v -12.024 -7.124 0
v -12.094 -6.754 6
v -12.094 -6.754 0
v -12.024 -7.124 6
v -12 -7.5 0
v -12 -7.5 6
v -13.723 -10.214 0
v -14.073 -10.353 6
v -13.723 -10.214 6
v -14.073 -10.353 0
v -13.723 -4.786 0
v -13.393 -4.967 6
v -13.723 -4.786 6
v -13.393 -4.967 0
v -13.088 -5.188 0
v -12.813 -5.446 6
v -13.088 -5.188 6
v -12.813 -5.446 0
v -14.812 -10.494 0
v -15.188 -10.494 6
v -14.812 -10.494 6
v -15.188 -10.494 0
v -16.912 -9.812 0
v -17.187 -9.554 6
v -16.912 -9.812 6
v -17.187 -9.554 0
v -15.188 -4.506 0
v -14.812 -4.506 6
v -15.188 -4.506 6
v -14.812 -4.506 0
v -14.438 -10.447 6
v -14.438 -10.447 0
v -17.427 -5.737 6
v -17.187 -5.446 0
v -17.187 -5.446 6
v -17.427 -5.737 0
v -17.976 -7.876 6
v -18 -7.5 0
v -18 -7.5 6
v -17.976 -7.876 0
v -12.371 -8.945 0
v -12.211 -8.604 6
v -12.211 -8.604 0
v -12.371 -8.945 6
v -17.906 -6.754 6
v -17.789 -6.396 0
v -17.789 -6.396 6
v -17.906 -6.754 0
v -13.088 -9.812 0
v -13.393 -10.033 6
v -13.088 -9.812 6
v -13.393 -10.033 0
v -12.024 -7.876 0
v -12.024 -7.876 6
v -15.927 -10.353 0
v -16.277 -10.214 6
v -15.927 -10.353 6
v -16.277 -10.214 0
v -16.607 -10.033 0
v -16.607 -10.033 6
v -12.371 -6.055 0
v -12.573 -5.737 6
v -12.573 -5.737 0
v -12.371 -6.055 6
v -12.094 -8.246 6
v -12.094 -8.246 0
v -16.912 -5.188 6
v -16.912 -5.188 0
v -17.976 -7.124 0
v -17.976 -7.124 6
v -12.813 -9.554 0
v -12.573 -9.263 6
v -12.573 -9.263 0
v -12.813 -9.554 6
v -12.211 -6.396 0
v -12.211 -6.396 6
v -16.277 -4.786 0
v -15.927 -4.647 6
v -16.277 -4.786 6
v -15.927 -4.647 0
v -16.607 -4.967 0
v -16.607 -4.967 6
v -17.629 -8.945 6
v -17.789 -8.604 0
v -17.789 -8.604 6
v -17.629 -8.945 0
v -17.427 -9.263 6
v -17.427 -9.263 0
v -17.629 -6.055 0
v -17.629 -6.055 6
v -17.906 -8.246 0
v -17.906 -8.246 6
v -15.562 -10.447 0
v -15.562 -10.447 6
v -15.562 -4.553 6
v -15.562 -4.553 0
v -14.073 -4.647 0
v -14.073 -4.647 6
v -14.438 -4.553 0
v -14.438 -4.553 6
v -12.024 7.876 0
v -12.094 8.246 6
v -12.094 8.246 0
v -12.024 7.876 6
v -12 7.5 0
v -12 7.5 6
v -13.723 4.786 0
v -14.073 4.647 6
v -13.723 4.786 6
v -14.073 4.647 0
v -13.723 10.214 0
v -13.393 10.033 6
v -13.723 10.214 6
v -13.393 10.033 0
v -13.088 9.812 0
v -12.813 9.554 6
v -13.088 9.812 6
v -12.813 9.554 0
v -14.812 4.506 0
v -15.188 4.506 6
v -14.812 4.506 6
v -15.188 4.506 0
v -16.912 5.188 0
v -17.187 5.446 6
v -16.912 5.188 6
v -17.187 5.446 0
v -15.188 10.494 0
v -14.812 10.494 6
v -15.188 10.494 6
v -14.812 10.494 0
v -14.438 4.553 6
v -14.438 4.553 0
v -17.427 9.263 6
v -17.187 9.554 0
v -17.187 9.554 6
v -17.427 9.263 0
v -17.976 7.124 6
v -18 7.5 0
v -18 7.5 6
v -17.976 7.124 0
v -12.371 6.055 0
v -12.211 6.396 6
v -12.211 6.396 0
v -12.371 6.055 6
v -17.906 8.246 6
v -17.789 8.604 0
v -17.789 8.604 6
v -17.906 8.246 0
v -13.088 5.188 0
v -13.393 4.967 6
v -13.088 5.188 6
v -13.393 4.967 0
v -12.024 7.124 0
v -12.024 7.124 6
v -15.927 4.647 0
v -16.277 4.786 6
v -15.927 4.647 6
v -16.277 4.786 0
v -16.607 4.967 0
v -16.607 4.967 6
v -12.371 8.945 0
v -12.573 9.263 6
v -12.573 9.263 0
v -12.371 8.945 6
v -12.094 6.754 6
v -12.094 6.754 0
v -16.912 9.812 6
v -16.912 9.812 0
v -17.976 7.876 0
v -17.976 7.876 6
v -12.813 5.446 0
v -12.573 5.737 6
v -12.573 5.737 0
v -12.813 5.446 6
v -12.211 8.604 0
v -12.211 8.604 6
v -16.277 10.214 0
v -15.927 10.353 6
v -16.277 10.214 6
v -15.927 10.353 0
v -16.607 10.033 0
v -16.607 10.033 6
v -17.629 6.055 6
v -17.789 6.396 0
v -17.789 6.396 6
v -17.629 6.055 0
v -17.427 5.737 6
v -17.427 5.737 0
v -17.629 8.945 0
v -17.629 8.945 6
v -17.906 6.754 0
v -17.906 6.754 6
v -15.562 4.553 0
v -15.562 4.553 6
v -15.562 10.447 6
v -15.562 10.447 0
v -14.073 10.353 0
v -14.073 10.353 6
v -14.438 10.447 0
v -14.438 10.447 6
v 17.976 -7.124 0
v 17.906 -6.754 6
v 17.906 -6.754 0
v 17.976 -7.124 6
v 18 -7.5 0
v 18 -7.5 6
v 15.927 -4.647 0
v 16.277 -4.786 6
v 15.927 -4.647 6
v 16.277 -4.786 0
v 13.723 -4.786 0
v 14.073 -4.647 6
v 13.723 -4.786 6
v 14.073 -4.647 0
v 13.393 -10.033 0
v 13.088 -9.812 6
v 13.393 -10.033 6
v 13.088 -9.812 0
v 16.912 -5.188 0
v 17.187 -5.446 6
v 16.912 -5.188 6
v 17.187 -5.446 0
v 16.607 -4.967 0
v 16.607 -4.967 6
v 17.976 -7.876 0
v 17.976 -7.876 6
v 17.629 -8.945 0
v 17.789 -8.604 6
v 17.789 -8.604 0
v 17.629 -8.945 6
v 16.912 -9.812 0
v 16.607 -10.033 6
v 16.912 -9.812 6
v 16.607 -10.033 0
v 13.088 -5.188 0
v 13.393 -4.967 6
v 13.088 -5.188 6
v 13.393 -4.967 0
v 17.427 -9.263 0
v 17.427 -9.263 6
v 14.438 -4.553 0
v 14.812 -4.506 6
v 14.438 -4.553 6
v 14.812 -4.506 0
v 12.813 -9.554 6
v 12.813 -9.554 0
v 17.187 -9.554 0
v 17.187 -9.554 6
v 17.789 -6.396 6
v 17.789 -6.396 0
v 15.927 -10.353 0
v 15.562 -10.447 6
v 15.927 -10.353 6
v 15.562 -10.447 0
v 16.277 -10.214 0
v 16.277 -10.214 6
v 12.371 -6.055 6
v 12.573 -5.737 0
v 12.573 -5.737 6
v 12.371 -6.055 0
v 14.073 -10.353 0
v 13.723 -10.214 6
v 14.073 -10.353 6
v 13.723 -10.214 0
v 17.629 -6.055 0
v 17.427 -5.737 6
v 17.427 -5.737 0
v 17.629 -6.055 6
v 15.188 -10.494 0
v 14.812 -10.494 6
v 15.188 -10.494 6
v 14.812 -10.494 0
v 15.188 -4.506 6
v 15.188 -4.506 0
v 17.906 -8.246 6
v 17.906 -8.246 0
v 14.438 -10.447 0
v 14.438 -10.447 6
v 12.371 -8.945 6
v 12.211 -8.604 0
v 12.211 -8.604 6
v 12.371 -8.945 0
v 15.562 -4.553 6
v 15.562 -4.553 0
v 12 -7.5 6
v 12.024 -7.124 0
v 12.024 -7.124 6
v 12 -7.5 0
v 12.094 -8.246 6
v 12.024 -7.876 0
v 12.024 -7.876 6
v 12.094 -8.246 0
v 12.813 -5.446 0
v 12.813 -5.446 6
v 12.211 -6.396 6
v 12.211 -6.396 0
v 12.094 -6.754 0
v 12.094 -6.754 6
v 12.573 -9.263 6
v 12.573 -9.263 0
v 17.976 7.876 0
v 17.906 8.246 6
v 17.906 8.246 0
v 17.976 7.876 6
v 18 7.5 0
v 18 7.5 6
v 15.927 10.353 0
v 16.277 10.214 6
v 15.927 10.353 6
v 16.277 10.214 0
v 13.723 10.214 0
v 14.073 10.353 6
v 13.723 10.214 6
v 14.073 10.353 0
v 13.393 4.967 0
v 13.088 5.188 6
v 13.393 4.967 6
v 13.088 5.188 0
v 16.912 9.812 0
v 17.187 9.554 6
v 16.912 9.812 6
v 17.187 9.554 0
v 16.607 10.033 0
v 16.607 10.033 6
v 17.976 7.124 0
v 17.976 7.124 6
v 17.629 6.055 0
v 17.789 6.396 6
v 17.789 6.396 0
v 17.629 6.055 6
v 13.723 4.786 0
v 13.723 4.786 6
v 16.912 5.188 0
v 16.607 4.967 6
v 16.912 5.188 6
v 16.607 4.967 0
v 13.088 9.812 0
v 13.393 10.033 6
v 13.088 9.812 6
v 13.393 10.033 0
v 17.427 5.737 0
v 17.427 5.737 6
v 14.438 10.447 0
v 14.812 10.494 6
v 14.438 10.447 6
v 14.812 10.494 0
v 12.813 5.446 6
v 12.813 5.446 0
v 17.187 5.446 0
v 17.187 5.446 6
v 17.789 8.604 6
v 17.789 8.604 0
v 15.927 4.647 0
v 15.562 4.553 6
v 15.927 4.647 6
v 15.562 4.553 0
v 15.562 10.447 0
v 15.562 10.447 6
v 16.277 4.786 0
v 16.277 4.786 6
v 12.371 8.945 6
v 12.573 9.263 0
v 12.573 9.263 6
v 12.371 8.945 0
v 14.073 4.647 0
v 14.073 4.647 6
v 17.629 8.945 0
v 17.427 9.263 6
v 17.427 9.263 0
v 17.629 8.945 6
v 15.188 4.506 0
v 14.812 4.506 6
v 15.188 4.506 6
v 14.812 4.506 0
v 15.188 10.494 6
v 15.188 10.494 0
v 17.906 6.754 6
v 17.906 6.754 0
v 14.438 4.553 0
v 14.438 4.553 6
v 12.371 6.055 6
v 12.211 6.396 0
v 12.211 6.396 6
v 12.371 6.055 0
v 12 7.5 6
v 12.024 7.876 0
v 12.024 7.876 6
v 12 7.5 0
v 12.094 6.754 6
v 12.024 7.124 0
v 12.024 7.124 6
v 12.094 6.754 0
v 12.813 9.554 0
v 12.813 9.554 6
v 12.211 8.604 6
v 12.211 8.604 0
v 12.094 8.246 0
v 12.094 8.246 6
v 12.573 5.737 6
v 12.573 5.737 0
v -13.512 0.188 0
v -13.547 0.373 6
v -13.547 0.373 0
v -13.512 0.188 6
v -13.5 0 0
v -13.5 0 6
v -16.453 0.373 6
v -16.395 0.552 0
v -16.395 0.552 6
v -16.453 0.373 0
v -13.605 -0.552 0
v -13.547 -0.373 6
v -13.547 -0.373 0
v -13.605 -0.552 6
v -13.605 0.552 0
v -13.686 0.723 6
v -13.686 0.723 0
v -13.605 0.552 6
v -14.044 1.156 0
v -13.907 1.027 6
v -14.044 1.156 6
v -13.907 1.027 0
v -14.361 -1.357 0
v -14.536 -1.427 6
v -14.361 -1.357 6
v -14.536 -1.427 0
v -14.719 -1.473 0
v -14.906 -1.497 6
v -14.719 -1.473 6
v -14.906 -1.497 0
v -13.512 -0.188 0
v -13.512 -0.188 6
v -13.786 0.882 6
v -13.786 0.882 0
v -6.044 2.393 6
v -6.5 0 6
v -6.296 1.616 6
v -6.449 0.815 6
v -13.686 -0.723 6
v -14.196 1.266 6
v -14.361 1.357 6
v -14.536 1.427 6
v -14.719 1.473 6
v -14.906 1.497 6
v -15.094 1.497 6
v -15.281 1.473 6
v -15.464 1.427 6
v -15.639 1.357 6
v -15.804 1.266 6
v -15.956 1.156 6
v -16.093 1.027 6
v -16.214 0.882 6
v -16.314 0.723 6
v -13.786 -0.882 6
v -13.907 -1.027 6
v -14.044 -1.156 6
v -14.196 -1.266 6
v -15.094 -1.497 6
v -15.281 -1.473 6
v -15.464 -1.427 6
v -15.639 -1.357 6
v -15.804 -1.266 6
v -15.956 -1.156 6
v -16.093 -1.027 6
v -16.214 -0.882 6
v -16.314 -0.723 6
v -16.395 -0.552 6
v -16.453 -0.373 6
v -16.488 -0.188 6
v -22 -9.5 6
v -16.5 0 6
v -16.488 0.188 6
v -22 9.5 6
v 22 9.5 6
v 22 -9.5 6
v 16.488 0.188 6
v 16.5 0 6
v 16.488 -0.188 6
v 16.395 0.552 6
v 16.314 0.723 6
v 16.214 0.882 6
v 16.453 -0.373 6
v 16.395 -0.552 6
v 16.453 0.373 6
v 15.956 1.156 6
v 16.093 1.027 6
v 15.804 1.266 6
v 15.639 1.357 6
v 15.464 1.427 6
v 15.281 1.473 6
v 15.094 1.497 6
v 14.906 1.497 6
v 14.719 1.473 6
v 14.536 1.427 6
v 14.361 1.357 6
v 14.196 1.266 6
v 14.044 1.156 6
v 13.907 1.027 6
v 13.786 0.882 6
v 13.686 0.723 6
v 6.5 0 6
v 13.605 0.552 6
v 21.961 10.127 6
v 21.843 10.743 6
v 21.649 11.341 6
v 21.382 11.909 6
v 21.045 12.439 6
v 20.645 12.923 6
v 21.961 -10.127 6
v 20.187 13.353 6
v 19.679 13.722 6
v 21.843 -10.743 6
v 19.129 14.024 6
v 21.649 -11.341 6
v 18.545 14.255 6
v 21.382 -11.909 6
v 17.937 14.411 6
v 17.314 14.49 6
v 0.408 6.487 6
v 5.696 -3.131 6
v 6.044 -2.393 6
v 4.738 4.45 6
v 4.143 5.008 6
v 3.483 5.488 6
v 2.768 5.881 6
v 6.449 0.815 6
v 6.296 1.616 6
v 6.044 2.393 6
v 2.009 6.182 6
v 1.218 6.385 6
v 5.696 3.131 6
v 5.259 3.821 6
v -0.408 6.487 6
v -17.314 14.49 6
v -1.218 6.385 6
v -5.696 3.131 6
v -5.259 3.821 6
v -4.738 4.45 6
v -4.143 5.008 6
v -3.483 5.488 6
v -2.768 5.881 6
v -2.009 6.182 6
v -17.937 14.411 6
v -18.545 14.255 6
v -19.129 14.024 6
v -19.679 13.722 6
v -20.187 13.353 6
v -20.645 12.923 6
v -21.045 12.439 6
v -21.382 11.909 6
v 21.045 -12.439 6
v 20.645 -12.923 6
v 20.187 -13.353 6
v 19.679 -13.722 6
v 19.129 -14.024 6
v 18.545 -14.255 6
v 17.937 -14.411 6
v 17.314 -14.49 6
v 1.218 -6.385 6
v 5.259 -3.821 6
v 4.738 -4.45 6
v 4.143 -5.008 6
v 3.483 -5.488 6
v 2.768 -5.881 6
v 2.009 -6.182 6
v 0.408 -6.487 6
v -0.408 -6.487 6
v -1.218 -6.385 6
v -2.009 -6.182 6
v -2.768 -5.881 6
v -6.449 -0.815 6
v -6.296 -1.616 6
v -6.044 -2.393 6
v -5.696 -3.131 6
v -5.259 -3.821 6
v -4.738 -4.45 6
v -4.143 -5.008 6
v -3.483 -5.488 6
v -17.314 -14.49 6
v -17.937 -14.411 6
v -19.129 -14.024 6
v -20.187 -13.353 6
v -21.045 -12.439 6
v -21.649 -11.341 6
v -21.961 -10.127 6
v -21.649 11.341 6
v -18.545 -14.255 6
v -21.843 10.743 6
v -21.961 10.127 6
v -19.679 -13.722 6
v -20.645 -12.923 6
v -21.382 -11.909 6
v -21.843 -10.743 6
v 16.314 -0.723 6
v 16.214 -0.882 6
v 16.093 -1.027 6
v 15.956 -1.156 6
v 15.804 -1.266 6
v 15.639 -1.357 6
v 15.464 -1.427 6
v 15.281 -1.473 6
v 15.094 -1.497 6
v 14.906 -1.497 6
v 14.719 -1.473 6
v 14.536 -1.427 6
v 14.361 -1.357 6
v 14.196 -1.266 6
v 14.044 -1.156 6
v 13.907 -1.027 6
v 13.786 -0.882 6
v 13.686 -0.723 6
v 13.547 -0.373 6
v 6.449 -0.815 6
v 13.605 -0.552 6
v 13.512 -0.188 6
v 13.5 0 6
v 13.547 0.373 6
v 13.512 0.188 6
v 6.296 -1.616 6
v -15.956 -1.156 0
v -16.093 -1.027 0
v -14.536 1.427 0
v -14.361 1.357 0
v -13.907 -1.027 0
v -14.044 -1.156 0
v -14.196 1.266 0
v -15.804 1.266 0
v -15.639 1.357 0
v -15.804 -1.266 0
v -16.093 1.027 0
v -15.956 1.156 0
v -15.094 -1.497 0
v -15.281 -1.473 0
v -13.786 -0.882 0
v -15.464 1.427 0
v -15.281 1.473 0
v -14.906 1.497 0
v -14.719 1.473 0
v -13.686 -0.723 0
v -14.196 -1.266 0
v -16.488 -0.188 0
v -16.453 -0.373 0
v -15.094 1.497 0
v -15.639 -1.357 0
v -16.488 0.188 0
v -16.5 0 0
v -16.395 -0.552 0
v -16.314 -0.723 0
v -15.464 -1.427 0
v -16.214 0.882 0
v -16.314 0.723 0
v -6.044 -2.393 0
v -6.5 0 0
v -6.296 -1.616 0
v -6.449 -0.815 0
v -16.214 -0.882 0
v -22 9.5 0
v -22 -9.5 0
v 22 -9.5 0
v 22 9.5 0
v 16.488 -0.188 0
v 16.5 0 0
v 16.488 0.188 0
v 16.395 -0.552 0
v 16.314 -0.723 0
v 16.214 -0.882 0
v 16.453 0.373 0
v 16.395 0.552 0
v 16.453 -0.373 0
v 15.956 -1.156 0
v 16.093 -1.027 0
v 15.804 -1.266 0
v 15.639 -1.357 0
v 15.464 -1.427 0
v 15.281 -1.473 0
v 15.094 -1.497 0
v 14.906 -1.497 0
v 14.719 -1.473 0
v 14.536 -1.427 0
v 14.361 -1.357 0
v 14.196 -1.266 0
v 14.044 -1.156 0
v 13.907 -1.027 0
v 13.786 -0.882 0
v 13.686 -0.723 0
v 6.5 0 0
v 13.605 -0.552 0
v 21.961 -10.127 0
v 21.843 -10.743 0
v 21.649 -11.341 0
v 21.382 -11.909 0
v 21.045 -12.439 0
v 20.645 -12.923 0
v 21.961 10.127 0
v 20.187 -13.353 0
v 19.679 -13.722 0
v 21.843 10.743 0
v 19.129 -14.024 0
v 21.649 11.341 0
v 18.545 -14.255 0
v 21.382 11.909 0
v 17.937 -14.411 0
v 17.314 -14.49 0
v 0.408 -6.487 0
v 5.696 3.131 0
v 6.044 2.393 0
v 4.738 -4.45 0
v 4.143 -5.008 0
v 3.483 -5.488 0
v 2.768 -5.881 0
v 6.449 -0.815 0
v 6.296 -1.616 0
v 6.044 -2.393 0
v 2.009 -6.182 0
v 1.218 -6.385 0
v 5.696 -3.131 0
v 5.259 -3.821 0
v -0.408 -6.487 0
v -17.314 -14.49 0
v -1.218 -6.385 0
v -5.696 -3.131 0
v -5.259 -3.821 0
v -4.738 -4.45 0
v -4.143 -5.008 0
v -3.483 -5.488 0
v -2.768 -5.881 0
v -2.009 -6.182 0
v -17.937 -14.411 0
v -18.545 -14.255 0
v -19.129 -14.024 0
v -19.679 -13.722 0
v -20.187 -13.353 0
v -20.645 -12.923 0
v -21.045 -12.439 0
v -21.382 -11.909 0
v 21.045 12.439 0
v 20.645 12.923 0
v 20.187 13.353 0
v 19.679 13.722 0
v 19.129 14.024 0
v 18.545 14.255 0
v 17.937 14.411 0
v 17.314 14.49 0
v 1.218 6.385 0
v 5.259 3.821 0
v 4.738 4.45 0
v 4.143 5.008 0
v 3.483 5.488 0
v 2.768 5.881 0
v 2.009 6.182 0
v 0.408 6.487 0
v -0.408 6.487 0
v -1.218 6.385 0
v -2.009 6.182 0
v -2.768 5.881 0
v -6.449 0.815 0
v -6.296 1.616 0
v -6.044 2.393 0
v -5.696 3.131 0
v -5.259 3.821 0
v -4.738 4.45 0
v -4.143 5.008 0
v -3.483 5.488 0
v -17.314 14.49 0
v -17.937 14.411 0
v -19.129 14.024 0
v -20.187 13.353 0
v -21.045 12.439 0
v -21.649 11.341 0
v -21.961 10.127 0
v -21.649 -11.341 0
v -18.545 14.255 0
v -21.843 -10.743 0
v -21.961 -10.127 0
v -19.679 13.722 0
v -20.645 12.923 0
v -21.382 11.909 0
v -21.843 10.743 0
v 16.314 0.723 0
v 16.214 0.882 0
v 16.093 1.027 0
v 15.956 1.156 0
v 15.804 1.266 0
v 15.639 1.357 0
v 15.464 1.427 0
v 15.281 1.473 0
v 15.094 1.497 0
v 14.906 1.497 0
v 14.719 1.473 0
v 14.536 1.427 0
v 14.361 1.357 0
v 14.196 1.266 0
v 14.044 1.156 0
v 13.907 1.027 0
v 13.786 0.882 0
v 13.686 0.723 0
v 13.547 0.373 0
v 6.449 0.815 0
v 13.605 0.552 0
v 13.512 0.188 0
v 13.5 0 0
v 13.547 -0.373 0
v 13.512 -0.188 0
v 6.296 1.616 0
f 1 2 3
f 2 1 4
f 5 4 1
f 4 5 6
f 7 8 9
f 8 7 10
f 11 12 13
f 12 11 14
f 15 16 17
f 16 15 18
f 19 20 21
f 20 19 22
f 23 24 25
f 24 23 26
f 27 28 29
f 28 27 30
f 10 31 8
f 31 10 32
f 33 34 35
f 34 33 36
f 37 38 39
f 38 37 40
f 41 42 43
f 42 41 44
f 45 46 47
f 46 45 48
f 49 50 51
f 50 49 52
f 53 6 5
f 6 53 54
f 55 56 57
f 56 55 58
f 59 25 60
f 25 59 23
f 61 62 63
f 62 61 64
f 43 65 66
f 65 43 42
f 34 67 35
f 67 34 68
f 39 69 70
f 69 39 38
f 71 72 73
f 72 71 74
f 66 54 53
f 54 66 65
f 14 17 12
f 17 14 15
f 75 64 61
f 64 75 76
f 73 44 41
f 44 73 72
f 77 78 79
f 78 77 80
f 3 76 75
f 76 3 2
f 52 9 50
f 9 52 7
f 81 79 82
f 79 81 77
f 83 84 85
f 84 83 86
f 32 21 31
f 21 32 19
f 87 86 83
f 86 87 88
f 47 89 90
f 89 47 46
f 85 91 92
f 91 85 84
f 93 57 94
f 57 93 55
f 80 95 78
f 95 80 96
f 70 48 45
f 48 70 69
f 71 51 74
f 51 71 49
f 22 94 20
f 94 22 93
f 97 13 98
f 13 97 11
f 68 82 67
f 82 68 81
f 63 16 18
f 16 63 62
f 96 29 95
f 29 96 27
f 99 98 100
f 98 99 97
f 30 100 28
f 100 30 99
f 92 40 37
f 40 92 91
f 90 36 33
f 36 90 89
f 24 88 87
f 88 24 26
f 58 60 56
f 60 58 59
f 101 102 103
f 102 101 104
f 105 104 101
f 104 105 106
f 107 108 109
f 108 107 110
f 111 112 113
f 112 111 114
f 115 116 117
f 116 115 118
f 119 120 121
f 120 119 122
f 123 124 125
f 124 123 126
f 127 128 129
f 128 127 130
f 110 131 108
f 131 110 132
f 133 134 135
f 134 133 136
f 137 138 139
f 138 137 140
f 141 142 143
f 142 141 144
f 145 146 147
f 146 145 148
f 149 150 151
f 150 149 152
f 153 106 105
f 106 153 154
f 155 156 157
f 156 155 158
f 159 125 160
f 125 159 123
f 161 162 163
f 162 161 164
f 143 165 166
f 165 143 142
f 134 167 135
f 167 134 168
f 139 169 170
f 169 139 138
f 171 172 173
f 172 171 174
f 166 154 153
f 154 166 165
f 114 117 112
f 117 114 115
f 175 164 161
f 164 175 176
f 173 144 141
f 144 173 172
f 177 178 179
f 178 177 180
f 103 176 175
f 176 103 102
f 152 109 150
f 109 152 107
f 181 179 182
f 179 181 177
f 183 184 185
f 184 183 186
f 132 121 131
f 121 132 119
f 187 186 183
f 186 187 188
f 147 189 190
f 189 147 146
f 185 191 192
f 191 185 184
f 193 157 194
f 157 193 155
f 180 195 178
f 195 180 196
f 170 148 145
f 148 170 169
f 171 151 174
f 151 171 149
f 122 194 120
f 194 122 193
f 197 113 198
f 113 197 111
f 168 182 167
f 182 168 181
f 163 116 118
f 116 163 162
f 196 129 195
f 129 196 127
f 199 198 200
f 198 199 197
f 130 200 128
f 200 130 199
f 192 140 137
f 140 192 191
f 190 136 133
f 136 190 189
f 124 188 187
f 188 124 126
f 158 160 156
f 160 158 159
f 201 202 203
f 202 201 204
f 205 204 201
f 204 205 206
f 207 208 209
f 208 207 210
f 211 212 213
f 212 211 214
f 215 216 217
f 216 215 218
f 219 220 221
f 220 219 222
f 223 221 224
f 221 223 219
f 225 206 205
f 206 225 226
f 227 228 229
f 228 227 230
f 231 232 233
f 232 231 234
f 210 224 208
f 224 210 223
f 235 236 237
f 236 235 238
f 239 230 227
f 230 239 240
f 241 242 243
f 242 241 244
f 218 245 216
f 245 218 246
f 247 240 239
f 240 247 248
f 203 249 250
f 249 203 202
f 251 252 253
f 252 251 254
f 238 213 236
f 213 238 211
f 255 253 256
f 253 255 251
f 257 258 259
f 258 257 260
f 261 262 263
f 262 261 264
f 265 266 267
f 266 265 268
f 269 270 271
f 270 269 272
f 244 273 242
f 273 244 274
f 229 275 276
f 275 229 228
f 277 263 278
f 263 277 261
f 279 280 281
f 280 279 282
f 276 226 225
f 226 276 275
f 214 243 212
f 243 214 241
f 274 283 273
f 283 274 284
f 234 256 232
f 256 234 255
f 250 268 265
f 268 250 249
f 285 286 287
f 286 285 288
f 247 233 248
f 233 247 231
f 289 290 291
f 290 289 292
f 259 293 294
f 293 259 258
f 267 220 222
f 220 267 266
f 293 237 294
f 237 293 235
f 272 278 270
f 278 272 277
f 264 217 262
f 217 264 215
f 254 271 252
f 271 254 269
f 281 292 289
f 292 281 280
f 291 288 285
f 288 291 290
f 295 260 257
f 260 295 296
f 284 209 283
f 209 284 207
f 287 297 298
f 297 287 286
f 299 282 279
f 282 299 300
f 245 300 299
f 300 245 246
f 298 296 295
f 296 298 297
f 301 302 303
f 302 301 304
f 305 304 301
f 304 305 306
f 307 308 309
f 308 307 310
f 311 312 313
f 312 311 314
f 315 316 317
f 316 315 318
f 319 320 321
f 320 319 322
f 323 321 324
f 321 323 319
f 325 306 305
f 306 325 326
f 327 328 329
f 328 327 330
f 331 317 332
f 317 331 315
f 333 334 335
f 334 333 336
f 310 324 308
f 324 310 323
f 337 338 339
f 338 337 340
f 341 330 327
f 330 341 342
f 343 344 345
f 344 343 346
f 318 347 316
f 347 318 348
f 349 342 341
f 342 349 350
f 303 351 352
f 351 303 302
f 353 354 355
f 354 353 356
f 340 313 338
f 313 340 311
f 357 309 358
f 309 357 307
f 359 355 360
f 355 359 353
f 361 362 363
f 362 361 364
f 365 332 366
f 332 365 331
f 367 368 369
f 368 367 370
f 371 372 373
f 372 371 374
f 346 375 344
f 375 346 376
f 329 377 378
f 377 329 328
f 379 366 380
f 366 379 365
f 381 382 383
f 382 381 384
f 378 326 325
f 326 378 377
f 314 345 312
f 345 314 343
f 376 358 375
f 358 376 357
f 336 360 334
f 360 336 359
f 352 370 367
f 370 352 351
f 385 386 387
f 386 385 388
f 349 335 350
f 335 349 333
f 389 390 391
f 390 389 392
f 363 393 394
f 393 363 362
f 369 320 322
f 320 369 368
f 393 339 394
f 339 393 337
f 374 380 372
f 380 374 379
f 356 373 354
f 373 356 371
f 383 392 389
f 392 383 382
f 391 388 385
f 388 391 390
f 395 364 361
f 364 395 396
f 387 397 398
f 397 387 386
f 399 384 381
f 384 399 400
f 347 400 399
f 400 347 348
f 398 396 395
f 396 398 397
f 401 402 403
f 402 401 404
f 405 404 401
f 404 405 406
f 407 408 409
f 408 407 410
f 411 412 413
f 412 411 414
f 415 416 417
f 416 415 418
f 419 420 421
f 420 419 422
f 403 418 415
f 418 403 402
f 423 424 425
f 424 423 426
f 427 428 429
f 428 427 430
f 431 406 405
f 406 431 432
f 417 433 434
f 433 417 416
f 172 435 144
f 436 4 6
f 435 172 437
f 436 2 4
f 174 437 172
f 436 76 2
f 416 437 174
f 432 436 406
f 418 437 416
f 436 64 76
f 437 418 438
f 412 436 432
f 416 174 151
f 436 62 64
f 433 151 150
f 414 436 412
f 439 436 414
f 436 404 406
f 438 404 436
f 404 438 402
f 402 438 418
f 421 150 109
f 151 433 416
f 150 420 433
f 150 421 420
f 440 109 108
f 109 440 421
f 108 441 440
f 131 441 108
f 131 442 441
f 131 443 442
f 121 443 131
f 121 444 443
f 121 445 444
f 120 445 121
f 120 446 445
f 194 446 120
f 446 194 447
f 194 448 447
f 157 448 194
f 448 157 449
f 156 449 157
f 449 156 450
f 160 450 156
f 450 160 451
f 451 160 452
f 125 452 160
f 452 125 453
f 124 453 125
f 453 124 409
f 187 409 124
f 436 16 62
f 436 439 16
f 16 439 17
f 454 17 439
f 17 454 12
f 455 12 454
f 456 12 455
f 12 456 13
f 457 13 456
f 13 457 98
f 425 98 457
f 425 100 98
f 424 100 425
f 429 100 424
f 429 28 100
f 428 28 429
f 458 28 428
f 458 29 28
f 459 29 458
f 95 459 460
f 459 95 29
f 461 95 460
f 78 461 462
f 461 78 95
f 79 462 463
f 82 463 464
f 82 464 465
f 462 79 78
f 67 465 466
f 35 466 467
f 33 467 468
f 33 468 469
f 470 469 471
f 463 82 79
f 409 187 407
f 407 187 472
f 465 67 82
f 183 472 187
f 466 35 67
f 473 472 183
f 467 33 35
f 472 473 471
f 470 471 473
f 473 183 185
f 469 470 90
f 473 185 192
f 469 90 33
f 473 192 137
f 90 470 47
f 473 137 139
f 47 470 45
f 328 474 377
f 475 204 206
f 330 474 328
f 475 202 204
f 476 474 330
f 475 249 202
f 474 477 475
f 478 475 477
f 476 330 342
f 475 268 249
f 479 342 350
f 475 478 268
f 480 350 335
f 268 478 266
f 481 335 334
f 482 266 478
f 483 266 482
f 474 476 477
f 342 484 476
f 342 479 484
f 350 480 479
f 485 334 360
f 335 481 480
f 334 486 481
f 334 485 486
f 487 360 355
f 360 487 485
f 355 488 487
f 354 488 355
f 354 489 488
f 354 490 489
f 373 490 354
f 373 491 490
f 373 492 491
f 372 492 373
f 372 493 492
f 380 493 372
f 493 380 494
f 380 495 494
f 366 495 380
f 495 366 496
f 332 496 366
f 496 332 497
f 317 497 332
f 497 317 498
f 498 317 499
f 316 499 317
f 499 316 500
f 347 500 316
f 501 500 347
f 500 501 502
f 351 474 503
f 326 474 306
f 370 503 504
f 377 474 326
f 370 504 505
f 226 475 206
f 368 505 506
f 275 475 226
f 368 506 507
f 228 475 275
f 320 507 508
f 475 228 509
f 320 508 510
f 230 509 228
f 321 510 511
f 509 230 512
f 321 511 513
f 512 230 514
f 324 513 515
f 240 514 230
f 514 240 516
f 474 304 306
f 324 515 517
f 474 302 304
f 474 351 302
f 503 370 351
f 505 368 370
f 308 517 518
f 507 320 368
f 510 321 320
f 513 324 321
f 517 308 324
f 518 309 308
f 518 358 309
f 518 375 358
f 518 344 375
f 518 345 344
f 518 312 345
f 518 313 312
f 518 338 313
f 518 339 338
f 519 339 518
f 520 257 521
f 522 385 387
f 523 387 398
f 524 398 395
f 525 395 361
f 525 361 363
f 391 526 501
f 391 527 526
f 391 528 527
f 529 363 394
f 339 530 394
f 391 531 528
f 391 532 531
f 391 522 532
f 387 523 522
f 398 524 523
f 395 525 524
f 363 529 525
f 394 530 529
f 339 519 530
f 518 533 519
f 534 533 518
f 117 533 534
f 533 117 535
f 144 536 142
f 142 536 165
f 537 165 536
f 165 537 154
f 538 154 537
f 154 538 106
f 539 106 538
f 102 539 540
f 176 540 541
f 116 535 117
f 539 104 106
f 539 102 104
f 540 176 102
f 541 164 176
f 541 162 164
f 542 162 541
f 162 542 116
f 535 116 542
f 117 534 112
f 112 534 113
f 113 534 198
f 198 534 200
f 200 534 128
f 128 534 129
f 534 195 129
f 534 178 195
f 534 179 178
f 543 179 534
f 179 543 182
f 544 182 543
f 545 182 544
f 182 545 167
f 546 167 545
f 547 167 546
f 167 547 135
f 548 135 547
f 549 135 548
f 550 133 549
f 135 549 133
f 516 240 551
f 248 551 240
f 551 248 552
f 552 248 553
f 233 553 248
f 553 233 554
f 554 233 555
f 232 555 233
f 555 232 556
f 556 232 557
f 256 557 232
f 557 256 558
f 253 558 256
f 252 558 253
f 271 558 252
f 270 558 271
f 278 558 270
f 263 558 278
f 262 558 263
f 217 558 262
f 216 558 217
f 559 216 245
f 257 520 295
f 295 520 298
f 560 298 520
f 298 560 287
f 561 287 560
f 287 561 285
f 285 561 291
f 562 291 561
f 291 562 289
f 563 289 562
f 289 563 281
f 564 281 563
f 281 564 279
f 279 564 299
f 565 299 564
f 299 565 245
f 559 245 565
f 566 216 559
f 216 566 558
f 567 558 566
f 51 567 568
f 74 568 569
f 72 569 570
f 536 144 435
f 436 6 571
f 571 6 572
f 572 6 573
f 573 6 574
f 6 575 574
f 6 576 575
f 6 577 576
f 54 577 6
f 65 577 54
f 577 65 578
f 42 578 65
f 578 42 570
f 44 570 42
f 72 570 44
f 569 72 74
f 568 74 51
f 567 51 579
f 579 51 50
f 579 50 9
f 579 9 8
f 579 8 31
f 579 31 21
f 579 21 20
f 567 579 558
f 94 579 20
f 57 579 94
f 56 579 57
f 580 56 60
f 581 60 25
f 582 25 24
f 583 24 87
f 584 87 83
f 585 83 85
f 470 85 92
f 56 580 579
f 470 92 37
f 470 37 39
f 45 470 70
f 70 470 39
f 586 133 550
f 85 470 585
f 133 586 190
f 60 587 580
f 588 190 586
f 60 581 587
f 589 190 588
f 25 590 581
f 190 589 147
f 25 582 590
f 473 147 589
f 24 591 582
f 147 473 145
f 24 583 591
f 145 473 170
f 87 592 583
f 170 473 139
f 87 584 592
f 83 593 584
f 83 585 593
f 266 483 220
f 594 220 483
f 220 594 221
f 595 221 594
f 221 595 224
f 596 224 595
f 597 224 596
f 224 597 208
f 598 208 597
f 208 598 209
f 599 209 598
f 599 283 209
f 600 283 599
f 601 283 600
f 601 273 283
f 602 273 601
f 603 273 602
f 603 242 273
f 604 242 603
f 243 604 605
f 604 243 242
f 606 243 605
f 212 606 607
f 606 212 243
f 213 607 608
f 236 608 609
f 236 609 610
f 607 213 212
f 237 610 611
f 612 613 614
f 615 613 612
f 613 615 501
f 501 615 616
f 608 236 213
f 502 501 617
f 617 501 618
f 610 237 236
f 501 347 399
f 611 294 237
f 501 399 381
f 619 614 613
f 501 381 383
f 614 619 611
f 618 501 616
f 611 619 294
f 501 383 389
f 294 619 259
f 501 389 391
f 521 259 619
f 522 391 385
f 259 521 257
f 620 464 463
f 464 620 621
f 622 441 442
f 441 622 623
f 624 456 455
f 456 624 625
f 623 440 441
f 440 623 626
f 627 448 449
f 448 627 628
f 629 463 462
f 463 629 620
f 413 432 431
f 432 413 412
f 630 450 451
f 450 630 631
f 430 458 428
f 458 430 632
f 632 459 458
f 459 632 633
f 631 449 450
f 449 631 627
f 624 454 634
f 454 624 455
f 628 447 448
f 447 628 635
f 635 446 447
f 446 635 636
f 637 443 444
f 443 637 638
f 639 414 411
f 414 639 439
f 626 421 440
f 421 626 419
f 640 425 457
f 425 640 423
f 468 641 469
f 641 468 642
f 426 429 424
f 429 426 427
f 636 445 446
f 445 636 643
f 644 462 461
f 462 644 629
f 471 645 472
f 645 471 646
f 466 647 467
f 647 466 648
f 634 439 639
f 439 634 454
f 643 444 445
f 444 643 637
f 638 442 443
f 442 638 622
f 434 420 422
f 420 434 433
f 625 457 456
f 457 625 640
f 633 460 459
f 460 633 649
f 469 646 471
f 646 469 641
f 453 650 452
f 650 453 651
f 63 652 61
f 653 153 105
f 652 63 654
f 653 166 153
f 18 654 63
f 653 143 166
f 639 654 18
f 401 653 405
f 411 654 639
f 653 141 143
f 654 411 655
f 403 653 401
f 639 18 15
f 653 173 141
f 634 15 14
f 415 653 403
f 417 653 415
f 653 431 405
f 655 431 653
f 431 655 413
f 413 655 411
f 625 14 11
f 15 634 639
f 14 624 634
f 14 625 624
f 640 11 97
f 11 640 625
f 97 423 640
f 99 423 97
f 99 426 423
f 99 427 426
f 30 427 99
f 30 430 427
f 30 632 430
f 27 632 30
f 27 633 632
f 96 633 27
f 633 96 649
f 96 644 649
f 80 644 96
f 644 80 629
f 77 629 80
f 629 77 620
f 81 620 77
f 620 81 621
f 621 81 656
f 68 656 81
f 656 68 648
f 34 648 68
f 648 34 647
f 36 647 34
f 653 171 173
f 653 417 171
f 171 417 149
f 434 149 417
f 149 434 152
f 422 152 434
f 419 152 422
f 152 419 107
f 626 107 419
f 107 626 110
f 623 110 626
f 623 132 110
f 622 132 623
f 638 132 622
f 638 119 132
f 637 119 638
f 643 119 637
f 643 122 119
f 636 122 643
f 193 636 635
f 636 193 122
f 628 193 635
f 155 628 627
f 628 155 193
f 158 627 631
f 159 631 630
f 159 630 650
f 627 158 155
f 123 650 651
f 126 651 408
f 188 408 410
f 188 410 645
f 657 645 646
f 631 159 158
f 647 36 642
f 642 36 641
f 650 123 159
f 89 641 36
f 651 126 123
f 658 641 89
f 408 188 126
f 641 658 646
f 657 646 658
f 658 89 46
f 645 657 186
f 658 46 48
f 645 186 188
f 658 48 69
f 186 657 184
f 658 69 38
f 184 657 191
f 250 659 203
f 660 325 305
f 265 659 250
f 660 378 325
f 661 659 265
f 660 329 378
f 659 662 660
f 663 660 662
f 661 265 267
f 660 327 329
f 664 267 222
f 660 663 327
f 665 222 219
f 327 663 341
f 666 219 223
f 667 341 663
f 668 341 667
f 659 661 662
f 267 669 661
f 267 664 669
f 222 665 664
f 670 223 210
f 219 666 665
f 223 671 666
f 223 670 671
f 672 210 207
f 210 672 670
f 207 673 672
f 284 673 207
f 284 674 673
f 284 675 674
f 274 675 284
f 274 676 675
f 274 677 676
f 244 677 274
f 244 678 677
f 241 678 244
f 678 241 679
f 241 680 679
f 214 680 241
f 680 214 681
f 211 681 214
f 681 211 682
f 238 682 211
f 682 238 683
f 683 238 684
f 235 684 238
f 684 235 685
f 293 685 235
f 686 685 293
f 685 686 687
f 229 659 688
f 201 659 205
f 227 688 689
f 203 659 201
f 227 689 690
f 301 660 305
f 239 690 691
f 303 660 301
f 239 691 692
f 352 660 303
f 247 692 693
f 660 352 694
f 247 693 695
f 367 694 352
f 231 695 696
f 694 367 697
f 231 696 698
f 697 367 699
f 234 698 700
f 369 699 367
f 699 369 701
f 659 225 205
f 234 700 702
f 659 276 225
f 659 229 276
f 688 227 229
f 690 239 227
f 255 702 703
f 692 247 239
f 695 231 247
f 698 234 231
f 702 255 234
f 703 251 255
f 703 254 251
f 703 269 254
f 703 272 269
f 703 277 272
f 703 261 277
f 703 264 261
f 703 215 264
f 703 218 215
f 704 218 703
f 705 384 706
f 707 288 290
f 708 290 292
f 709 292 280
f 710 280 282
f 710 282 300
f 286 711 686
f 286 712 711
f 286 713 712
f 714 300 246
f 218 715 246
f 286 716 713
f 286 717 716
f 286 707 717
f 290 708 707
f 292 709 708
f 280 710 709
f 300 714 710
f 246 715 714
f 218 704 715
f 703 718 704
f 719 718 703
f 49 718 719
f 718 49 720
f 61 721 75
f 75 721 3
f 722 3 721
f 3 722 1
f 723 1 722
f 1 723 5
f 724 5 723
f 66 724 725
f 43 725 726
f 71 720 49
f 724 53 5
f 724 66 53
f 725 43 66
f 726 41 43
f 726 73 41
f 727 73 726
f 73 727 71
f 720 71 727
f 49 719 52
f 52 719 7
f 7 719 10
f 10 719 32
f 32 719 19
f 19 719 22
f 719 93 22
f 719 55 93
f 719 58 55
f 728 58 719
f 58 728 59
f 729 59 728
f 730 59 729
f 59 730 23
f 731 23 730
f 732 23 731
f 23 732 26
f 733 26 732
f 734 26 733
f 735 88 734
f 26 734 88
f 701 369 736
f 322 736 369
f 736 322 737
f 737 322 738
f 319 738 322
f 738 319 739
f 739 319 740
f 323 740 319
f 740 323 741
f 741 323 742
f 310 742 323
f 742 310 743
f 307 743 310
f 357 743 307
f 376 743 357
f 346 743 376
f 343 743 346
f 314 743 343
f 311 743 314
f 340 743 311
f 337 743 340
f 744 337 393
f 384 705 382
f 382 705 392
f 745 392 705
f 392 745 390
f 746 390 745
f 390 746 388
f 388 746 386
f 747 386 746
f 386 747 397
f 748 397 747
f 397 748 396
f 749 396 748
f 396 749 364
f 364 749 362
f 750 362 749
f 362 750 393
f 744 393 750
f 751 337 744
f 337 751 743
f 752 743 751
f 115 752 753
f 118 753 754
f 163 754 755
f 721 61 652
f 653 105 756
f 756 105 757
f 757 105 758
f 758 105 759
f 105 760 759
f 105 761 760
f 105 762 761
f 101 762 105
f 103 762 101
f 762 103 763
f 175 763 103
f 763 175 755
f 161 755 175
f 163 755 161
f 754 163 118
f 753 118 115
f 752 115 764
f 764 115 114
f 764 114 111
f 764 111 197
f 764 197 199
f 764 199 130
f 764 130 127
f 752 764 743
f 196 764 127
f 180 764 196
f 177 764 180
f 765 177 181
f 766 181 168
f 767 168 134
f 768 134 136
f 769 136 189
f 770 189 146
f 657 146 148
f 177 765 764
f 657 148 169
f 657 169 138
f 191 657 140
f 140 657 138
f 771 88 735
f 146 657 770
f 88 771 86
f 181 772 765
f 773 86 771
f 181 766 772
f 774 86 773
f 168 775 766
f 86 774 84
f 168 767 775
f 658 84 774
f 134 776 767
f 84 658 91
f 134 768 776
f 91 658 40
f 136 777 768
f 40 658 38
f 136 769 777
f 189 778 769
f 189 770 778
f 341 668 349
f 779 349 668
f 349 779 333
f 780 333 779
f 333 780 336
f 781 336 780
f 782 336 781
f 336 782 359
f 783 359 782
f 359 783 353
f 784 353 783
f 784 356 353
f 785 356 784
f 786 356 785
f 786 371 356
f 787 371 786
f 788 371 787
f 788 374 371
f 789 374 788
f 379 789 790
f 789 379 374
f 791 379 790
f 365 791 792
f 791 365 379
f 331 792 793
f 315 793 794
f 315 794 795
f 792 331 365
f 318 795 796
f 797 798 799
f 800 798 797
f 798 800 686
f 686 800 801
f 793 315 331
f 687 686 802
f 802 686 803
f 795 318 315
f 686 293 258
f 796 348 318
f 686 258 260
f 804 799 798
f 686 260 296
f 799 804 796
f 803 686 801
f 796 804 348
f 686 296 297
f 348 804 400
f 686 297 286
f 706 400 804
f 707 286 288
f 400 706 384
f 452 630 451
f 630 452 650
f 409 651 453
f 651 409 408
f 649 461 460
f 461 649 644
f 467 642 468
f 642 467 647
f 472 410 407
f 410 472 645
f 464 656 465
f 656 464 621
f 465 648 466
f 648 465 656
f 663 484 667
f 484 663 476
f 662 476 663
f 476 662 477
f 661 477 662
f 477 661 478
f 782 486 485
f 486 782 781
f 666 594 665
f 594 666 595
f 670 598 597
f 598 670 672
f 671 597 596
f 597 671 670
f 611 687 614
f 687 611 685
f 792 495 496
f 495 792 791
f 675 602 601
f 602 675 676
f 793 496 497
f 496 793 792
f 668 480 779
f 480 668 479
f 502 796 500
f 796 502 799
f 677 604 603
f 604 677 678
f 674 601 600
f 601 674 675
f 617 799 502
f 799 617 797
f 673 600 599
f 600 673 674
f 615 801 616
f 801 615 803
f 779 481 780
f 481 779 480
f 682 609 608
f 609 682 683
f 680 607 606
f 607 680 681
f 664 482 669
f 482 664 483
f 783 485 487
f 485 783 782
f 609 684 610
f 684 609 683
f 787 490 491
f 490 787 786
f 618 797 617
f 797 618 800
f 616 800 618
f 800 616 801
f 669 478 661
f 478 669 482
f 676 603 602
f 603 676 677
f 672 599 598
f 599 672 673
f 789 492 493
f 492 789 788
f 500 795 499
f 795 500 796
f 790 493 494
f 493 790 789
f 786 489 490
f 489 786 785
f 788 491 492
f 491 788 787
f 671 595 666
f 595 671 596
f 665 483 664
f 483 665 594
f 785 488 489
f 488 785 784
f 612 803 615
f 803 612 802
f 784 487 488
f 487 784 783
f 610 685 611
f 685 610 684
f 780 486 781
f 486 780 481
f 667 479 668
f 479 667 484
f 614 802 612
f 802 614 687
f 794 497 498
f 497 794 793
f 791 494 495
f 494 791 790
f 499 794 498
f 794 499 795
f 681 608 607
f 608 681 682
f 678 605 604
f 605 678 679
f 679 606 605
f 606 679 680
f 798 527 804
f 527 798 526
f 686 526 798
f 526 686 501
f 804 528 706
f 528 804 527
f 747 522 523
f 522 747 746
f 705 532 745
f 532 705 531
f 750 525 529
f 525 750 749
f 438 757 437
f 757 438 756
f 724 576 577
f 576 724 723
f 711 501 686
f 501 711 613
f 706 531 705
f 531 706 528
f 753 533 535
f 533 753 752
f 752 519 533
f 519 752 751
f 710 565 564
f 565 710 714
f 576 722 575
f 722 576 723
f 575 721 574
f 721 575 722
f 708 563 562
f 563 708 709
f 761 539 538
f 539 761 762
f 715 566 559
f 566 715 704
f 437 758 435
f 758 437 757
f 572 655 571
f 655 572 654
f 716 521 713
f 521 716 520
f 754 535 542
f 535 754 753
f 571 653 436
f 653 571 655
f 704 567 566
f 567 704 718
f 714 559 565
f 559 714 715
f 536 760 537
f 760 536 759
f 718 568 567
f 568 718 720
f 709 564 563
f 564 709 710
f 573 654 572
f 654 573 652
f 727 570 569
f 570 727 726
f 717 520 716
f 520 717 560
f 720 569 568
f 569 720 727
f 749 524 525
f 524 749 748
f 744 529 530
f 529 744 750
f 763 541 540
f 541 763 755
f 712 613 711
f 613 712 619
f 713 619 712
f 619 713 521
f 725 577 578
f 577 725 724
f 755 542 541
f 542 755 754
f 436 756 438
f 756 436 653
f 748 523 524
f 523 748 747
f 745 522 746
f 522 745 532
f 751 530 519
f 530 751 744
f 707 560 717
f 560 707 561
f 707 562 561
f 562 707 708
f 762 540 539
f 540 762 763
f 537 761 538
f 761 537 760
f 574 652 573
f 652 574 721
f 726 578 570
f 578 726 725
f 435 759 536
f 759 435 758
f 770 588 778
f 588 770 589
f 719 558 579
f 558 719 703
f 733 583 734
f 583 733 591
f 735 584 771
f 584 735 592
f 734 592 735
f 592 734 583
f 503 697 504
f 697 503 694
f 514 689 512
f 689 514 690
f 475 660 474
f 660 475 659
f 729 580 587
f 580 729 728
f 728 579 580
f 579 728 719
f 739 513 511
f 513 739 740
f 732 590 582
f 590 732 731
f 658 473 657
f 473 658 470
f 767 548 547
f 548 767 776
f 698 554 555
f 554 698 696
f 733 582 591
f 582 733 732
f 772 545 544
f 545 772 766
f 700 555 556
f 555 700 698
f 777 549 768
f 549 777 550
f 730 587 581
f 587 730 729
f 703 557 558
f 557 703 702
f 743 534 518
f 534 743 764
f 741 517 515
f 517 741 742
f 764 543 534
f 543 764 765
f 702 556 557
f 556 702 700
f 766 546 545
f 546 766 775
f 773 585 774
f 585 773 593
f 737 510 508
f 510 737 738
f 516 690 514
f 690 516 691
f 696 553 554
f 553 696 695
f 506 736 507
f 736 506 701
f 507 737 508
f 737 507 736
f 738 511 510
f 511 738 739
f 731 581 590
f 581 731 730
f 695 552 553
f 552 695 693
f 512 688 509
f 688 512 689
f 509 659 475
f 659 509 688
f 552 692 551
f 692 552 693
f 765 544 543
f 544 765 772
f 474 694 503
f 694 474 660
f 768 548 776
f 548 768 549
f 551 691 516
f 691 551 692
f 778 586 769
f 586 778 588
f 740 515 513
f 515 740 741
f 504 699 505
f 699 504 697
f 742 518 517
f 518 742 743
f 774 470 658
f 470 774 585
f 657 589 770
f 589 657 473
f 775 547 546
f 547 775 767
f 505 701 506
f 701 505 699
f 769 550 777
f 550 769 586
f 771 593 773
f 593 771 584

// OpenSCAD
$fn = 50;


difference() {
	union() {
		hull() {
			translate(v = [-17.0000000000, 9.5000000000, 0]) {
				cylinder(h = 6, r = 5);
			}
			translate(v = [17.0000000000, 9.5000000000, 0]) {
				cylinder(h = 6, r = 5);
			}
			translate(v = [-17.0000000000, -9.5000000000, 0]) {
				cylinder(h = 6, r = 5);
			}
			translate(v = [17.0000000000, -9.5000000000, 0]) {
				cylinder(h = 6, r = 5);
			}
		}
	}
	union() {
		#translate(v = [-15.0000000000, -7.5000000000, 0]) {
			cylinder(h = 6, r = 3.0000000000);
		}
		#translate(v = [-15.0000000000, 7.5000000000, 0]) {
			cylinder(h = 6, r = 3.0000000000);
		}
		#translate(v = [15.0000000000, -7.5000000000, 0]) {
			cylinder(h = 6, r = 3.0000000000);
		}
		#translate(v = [15.0000000000, 7.5000000000, 0]) {
			cylinder(h = 6, r = 3.0000000000);
		}
		#translate(v = [-15.0000000000, -7.5000000000, -100.0000000000]) {
			cylinder(h = 200, r = 3.0000000000);
		}
		#translate(v = [-15.0000000000, 7.5000000000, -100.0000000000]) {
			cylinder(h = 200, r = 3.0000000000);
		}
		#translate(v = [15.0000000000, -7.5000000000, -100.0000000000]) {
			cylinder(h = 200, r = 3.0000000000);
		}
		#translate(v = [15.0000000000, 7.5000000000, -100.0000000000]) {
			cylinder(h = 200, r = 3.0000000000);
		}
		#translate(v = [-15.0000000000, -7.5000000000, 0]) {
			cylinder(h = 6, r = 1.5000000000);
		}
		#translate(v = [-15.0000000000, 0.0000000000, 0]) {
			cylinder(h = 6, r = 1.5000000000);
		}
		#translate(v = [-15.0000000000, 7.5000000000, 0]) {
			cylinder(h = 6, r = 1.5000000000);
		}
		#translate(v = [15.0000000000, -7.5000000000, 0]) {
			cylinder(h = 6, r = 1.5000000000);
		}
		#translate(v = [15.0000000000, 0.0000000000, 0]) {
			cylinder(h = 6, r = 1.5000000000);
		}
		#translate(v = [15.0000000000, 7.5000000000, 0]) {
			cylinder(h = 6, r = 1.5000000000);
		}
		#translate(v = [-15.0000000000, -7.5000000000, 0]) {
			cylinder(h = 6, r = 1.5000000000);
		}
		#translate(v = [-15.0000000000, 0.0000000000, 0]) {
			cylinder(h = 6, r = 1.5000000000);
		}
		#translate(v = [-15.0000000000, 7.5000000000, 0]) {
			cylinder(h = 6, r = 1.5000000000);
		}
		#translate(v = [15.0000000000, -7.5000000000, 0]) {
			cylinder(h = 6, r = 1.5000000000);
		}
		#translate(v = [15.0000000000, 0.0000000000, 0]) {
			cylinder(h = 6, r = 1.5000000000);
		}
		#translate(v = [15.0000000000, 7.5000000000, 0]) {
			cylinder(h = 6, r = 1.5000000000);
		}
		#translate(v = [-15.0000000000, -7.5000000000, 0]) {
			cylinder(h = 6, r = 1.5000000000);
		}
		#translate(v = [-15.0000000000, 0.0000000000, 0]) {
			cylinder(h = 6, r = 1.5000000000);
		}
		#translate(v = [-15.0000000000, 7.5000000000, 0]) {
			cylinder(h = 6, r = 1.5000000000);
		}
		#translate(v = [15.0000000000, -7.5000000000, 0]) {
			cylinder(h = 6, r = 1.5000000000);
		}
		#translate(v = [15.0000000000, 0.0000000000, 0]) {
			cylinder(h = 6, r = 1.5000000000);
		}
		#translate(v = [15.0000000000, 7.5000000000, 0]) {
			cylinder(h = 6, r = 1.5000000000);
		}
		#cylinder(h = 6, r = 6.5000000000);
	}
}
